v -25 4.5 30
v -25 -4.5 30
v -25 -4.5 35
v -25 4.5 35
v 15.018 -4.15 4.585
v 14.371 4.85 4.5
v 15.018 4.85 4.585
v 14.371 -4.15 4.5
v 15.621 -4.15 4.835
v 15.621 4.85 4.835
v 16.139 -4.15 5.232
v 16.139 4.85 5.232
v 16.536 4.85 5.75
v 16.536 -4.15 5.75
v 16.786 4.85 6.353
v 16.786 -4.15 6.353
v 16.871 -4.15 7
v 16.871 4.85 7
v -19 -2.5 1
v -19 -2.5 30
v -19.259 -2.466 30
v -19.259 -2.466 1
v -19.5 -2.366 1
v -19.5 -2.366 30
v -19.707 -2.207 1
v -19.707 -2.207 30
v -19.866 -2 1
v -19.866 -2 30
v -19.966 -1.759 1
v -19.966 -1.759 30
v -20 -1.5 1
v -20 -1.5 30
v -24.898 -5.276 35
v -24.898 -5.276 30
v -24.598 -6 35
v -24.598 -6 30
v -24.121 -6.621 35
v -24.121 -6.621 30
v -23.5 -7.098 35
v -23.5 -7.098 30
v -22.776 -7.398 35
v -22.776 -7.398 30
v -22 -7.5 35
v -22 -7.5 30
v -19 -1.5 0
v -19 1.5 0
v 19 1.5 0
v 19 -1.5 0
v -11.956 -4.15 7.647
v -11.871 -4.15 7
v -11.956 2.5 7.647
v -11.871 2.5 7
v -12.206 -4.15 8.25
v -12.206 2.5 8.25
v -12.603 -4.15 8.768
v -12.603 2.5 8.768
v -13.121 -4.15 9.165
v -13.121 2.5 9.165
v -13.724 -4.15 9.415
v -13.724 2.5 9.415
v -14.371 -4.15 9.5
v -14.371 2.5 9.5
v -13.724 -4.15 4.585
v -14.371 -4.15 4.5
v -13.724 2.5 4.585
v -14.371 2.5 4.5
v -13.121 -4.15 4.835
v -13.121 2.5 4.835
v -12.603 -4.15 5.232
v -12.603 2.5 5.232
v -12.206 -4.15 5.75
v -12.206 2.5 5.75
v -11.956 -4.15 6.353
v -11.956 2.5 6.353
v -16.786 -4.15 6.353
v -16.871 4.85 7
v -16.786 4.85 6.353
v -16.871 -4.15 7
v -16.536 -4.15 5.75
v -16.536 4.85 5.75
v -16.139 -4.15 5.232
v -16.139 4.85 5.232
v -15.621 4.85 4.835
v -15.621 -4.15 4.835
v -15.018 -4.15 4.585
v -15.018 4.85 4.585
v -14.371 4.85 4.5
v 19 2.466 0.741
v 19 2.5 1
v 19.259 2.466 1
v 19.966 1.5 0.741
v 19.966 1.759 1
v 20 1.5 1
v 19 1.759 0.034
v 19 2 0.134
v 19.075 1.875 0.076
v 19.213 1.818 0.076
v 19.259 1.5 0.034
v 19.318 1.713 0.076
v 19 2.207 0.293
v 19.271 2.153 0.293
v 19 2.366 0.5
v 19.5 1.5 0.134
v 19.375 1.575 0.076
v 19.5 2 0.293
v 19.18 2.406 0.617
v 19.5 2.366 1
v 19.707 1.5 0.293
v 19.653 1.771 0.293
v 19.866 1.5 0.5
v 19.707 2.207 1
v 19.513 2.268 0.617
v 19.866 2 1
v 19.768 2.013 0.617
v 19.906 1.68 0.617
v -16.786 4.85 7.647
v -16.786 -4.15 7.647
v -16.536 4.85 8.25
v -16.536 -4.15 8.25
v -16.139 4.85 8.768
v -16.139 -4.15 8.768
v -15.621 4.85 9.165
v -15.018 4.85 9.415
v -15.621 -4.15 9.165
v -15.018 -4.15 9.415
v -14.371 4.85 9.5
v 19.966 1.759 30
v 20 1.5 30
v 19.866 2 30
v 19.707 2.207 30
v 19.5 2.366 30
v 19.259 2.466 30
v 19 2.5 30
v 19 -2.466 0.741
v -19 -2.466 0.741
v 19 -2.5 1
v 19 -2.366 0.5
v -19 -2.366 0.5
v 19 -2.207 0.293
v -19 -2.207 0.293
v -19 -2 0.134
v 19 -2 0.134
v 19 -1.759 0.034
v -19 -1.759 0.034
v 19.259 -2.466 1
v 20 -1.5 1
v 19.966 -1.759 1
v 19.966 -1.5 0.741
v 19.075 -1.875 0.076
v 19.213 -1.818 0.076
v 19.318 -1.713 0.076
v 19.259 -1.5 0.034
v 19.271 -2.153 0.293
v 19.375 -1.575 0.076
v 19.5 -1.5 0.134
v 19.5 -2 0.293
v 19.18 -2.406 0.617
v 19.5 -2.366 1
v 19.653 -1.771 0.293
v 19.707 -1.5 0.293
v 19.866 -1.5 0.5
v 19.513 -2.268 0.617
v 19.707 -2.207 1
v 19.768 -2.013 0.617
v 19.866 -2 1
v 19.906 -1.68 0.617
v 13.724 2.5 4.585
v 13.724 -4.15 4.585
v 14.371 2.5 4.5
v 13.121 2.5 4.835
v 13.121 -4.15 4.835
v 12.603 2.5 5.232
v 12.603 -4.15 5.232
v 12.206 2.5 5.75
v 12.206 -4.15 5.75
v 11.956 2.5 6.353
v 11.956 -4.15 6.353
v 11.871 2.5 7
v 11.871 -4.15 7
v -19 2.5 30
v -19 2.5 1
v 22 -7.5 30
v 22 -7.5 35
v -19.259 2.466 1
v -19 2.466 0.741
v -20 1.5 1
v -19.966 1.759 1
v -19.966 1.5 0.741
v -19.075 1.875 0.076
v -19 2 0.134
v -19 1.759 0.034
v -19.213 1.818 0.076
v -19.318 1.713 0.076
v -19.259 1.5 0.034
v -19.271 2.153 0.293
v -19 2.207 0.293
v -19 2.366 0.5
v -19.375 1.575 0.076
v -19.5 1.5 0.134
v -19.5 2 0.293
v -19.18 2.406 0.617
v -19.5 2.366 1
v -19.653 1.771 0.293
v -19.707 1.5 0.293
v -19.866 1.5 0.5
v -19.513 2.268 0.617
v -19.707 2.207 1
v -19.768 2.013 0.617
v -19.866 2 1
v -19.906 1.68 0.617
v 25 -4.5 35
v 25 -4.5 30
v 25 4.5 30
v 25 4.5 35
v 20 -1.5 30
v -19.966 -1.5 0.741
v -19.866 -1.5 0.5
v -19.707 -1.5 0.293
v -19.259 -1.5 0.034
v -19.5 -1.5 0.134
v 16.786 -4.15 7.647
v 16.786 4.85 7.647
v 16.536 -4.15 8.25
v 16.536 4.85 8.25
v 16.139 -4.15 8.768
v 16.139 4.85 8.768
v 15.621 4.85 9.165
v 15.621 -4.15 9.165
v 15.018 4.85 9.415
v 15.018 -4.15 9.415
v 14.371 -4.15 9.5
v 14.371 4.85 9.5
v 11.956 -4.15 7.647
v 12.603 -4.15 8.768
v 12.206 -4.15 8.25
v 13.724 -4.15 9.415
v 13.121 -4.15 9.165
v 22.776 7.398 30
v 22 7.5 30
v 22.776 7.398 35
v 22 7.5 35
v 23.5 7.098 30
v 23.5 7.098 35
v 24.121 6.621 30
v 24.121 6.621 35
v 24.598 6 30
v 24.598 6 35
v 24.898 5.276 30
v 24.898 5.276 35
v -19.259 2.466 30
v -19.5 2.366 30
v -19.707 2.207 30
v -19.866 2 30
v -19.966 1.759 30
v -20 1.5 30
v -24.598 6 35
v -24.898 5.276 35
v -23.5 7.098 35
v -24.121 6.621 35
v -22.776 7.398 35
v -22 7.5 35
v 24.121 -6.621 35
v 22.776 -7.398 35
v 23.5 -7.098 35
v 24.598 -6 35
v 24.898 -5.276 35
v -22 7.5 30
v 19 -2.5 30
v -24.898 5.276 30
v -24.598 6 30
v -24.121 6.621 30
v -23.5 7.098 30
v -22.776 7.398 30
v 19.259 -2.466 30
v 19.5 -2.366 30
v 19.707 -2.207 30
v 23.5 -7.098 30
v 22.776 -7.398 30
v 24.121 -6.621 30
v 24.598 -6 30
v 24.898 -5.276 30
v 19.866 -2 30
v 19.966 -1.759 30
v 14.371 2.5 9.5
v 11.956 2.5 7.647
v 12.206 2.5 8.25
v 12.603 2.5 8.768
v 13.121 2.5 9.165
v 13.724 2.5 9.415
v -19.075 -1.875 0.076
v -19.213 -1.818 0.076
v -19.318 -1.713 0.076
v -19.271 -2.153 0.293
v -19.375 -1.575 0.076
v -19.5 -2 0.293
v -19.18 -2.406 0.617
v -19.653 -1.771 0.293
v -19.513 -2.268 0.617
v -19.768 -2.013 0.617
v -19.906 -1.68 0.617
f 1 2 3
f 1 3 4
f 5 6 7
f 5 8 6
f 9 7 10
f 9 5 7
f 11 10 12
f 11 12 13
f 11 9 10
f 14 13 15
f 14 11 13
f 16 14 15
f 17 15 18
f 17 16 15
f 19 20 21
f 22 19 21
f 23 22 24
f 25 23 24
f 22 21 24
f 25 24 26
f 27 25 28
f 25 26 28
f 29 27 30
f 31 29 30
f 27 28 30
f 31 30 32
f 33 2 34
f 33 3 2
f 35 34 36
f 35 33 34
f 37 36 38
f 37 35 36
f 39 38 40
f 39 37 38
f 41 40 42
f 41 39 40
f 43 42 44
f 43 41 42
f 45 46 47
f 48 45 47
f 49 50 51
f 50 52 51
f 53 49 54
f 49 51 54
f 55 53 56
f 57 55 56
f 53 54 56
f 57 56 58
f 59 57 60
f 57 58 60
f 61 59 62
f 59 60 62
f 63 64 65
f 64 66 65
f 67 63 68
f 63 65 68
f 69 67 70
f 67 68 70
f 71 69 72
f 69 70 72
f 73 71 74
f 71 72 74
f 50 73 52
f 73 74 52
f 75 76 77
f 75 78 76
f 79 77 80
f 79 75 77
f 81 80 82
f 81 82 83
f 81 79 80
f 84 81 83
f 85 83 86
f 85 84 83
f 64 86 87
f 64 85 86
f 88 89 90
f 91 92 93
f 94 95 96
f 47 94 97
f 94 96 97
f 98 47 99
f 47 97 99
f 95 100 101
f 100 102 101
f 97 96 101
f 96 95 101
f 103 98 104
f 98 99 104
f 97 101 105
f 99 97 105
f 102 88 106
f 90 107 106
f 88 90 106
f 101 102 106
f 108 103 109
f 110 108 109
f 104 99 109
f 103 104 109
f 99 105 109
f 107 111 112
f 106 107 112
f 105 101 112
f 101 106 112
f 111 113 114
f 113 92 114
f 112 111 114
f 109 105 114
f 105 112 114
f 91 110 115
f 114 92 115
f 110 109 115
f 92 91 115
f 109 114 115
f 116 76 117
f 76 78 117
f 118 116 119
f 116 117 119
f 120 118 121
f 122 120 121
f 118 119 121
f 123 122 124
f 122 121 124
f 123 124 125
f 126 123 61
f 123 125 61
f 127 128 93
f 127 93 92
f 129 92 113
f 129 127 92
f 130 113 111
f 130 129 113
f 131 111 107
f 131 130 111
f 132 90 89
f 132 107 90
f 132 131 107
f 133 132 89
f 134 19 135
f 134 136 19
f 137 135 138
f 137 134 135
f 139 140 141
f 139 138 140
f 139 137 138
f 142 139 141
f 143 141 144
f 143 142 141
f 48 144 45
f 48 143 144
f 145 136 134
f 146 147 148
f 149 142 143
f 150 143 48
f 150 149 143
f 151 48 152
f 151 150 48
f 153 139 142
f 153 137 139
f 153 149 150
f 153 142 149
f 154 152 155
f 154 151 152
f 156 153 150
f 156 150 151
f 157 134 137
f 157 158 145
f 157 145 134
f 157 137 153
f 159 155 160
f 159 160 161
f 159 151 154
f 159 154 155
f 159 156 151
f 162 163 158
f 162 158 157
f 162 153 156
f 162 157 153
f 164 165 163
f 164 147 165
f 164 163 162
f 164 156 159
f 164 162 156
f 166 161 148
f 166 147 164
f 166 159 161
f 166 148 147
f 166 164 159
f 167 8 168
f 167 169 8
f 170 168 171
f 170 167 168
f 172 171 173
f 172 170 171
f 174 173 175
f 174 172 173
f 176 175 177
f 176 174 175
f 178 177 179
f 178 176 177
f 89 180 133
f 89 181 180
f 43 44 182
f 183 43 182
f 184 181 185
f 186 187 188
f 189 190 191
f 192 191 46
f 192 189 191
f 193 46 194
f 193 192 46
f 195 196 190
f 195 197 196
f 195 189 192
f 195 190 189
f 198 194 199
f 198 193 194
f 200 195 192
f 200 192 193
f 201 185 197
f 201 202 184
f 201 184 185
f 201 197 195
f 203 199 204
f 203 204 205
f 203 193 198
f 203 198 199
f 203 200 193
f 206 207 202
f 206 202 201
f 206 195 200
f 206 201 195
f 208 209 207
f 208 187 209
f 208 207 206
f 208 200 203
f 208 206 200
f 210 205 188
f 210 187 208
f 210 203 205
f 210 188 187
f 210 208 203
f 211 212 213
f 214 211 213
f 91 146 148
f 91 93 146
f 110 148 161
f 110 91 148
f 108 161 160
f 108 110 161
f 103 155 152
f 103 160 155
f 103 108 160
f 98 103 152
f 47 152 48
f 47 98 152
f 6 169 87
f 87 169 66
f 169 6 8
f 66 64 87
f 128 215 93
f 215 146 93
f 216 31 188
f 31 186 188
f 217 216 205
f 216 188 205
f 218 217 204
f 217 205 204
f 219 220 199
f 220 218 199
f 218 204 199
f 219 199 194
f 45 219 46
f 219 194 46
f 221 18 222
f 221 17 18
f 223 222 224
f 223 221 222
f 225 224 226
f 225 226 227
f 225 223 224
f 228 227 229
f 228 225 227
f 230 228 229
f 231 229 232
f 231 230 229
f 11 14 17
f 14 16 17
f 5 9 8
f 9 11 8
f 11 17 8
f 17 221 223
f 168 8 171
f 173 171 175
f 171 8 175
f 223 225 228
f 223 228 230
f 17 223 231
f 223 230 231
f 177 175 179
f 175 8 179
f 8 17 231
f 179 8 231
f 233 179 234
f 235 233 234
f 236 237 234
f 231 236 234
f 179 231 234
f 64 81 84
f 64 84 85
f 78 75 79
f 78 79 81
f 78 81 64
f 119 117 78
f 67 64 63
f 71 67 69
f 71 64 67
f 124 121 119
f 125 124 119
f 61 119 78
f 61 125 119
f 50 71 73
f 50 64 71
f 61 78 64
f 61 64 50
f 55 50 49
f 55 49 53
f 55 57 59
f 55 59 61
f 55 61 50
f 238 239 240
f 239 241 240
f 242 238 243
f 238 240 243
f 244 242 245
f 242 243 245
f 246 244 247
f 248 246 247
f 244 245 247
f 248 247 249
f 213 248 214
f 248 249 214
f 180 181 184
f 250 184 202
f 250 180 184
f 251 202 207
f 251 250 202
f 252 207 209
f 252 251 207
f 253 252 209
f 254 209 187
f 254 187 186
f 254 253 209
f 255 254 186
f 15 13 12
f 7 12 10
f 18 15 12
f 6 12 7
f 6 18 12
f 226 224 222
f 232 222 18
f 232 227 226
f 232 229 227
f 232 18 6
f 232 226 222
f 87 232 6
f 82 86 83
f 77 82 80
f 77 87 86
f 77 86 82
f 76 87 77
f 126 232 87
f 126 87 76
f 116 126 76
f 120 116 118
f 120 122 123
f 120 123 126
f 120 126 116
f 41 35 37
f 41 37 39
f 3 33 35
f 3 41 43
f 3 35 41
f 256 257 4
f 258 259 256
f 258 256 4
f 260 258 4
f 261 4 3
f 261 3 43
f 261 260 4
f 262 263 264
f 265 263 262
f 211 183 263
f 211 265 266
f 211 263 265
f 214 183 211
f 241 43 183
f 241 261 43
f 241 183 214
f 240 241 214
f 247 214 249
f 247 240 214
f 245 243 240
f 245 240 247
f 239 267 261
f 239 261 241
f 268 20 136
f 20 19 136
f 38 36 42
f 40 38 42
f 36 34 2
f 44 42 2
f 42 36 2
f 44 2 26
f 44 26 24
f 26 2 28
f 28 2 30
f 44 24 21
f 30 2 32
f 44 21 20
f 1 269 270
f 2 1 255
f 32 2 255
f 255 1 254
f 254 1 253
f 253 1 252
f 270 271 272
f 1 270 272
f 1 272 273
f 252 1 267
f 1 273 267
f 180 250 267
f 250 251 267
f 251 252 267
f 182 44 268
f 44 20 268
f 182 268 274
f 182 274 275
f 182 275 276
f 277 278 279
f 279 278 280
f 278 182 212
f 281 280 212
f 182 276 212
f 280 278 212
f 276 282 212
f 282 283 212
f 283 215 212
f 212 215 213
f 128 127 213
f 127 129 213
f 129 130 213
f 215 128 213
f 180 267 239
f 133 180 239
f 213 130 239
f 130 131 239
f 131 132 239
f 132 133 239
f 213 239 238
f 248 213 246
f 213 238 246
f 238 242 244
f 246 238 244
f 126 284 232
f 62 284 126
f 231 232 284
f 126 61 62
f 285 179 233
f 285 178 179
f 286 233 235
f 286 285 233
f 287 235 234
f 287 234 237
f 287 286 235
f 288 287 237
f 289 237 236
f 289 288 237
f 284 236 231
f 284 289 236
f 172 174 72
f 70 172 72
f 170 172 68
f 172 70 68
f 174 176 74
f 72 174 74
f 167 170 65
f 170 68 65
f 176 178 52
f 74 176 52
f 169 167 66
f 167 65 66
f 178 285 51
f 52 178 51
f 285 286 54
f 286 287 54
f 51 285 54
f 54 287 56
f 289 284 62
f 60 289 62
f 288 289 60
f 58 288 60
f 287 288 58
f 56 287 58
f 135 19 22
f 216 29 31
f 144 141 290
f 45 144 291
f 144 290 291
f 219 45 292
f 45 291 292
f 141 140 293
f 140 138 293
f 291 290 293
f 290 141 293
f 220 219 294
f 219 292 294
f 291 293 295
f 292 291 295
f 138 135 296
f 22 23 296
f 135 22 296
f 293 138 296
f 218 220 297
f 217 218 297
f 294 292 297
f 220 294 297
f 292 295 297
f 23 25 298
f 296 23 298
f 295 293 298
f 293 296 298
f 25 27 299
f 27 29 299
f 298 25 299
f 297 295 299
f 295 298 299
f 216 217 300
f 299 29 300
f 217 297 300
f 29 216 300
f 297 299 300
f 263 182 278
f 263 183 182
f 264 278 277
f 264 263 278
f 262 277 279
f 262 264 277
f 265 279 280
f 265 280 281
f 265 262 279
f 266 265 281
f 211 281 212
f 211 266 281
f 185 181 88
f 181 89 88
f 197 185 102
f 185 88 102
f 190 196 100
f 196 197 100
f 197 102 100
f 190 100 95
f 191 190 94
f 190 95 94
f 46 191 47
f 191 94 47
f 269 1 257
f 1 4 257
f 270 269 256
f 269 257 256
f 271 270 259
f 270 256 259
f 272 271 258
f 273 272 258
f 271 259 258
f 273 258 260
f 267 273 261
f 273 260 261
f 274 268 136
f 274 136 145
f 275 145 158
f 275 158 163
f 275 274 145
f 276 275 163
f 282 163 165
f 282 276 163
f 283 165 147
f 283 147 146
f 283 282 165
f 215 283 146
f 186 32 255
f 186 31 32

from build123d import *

# Parameters (mm, degrees)
F0_W     = 40
F0_H     = 5
F1_DEPTH = 30
F2_W     = 50
F2_H     = 15
F3_DEPTH = 5
F4_R     = 1
F5_R     = 3
F7_W     = 11.8711991236
F7_H     = 2.3502776772
F8_DEPTH = 5
F10_R    = 2.49999


# Not quite as in the source:
# - a fillet or chamfer is up to 0.001 mm smaller than in the source, because OpenCascade refuses the exact size


with BuildPart() as f1:
    # F0 (on Top) → F1 (new body)
    with BuildSketch(Plane.XY):
        Rectangle(F0_W, F0_H)
    extrude(amount=F1_DEPTH)

    # F2 (on face) → F3 (join)
    with BuildSketch(Plane.XY.offset(30)):
        Rectangle(F2_W, F2_H)
    extrude(amount=F3_DEPTH)

    # F4
    f4_edges = [f1.edges().sort_by_distance(p)[0] for p in [
        (20, 2.5, 15),
        (20, -2.5, 15),
        (-20, -2.5, 15),
        (-20, 2.5, 15),
        (0, 2.5, 0),
        (0, -2.5, 0),
        (20, 0, 0),
        (-20, 0, 0),
    ]]
    fillet(f4_edges, radius=F4_R)

    # F5
    f5_edges = [f1.edges().sort_by_distance(p)[0] for p in [
        (25, 7.5, 32.5),
        (25, -7.5, 32.5),
        (-25, 7.5, 32.5),
        (-25, -7.5, 32.5),
    ]]
    fillet(f5_edges, radius=F5_R)


with BuildPart() as f8:
    # F7 (on offset) → F8 (new body)
    with BuildSketch(Plane(origin=(0, 0, 9.5), x_dir=(1, 0, 0), z_dir=(0, 0, -1))):
        Polygon((11.8711991236, -4.8502776772), (16.8711991236, -4.8502776772), (16.8711991236, 4.1497223228), (11.8711991236, 4.1497223228), (11.8711991236, -2.5), align=None)
        with Locations((5.9355995618, -3.6751388386)):
            Rectangle(F7_W, F7_H)
    extrude(amount=F8_DEPTH)

    # F9: F8 across plane


with BuildPart() as f8_1:
    add(f8.part)
    add(f8.part.mirror(Plane.YZ))

    # F10 (radius 2.5 in the source; OpenCascade refuses exactly that, so slightly less here)
    f10_edges = [f8_1.edges().sort_by_distance(p)[0] for p in [
        (-16.871199, 0.350278, 4.5),
        (-11.871199, -0.824861, 4.5),
        (11.871199, -0.824861, 4.5),
        (16.871199, 0.350278, 4.5),
        (16.871199, 0.350278, 9.5),
        (-11.871199, -0.824861, 9.5),
        (11.871199, -0.824861, 9.5),
        (-16.871199, 0.350278, 9.5),
    ]]
    fillet(f10_edges, radius=F10_R)


solid = Compound([f1.part, f8_1.part])
